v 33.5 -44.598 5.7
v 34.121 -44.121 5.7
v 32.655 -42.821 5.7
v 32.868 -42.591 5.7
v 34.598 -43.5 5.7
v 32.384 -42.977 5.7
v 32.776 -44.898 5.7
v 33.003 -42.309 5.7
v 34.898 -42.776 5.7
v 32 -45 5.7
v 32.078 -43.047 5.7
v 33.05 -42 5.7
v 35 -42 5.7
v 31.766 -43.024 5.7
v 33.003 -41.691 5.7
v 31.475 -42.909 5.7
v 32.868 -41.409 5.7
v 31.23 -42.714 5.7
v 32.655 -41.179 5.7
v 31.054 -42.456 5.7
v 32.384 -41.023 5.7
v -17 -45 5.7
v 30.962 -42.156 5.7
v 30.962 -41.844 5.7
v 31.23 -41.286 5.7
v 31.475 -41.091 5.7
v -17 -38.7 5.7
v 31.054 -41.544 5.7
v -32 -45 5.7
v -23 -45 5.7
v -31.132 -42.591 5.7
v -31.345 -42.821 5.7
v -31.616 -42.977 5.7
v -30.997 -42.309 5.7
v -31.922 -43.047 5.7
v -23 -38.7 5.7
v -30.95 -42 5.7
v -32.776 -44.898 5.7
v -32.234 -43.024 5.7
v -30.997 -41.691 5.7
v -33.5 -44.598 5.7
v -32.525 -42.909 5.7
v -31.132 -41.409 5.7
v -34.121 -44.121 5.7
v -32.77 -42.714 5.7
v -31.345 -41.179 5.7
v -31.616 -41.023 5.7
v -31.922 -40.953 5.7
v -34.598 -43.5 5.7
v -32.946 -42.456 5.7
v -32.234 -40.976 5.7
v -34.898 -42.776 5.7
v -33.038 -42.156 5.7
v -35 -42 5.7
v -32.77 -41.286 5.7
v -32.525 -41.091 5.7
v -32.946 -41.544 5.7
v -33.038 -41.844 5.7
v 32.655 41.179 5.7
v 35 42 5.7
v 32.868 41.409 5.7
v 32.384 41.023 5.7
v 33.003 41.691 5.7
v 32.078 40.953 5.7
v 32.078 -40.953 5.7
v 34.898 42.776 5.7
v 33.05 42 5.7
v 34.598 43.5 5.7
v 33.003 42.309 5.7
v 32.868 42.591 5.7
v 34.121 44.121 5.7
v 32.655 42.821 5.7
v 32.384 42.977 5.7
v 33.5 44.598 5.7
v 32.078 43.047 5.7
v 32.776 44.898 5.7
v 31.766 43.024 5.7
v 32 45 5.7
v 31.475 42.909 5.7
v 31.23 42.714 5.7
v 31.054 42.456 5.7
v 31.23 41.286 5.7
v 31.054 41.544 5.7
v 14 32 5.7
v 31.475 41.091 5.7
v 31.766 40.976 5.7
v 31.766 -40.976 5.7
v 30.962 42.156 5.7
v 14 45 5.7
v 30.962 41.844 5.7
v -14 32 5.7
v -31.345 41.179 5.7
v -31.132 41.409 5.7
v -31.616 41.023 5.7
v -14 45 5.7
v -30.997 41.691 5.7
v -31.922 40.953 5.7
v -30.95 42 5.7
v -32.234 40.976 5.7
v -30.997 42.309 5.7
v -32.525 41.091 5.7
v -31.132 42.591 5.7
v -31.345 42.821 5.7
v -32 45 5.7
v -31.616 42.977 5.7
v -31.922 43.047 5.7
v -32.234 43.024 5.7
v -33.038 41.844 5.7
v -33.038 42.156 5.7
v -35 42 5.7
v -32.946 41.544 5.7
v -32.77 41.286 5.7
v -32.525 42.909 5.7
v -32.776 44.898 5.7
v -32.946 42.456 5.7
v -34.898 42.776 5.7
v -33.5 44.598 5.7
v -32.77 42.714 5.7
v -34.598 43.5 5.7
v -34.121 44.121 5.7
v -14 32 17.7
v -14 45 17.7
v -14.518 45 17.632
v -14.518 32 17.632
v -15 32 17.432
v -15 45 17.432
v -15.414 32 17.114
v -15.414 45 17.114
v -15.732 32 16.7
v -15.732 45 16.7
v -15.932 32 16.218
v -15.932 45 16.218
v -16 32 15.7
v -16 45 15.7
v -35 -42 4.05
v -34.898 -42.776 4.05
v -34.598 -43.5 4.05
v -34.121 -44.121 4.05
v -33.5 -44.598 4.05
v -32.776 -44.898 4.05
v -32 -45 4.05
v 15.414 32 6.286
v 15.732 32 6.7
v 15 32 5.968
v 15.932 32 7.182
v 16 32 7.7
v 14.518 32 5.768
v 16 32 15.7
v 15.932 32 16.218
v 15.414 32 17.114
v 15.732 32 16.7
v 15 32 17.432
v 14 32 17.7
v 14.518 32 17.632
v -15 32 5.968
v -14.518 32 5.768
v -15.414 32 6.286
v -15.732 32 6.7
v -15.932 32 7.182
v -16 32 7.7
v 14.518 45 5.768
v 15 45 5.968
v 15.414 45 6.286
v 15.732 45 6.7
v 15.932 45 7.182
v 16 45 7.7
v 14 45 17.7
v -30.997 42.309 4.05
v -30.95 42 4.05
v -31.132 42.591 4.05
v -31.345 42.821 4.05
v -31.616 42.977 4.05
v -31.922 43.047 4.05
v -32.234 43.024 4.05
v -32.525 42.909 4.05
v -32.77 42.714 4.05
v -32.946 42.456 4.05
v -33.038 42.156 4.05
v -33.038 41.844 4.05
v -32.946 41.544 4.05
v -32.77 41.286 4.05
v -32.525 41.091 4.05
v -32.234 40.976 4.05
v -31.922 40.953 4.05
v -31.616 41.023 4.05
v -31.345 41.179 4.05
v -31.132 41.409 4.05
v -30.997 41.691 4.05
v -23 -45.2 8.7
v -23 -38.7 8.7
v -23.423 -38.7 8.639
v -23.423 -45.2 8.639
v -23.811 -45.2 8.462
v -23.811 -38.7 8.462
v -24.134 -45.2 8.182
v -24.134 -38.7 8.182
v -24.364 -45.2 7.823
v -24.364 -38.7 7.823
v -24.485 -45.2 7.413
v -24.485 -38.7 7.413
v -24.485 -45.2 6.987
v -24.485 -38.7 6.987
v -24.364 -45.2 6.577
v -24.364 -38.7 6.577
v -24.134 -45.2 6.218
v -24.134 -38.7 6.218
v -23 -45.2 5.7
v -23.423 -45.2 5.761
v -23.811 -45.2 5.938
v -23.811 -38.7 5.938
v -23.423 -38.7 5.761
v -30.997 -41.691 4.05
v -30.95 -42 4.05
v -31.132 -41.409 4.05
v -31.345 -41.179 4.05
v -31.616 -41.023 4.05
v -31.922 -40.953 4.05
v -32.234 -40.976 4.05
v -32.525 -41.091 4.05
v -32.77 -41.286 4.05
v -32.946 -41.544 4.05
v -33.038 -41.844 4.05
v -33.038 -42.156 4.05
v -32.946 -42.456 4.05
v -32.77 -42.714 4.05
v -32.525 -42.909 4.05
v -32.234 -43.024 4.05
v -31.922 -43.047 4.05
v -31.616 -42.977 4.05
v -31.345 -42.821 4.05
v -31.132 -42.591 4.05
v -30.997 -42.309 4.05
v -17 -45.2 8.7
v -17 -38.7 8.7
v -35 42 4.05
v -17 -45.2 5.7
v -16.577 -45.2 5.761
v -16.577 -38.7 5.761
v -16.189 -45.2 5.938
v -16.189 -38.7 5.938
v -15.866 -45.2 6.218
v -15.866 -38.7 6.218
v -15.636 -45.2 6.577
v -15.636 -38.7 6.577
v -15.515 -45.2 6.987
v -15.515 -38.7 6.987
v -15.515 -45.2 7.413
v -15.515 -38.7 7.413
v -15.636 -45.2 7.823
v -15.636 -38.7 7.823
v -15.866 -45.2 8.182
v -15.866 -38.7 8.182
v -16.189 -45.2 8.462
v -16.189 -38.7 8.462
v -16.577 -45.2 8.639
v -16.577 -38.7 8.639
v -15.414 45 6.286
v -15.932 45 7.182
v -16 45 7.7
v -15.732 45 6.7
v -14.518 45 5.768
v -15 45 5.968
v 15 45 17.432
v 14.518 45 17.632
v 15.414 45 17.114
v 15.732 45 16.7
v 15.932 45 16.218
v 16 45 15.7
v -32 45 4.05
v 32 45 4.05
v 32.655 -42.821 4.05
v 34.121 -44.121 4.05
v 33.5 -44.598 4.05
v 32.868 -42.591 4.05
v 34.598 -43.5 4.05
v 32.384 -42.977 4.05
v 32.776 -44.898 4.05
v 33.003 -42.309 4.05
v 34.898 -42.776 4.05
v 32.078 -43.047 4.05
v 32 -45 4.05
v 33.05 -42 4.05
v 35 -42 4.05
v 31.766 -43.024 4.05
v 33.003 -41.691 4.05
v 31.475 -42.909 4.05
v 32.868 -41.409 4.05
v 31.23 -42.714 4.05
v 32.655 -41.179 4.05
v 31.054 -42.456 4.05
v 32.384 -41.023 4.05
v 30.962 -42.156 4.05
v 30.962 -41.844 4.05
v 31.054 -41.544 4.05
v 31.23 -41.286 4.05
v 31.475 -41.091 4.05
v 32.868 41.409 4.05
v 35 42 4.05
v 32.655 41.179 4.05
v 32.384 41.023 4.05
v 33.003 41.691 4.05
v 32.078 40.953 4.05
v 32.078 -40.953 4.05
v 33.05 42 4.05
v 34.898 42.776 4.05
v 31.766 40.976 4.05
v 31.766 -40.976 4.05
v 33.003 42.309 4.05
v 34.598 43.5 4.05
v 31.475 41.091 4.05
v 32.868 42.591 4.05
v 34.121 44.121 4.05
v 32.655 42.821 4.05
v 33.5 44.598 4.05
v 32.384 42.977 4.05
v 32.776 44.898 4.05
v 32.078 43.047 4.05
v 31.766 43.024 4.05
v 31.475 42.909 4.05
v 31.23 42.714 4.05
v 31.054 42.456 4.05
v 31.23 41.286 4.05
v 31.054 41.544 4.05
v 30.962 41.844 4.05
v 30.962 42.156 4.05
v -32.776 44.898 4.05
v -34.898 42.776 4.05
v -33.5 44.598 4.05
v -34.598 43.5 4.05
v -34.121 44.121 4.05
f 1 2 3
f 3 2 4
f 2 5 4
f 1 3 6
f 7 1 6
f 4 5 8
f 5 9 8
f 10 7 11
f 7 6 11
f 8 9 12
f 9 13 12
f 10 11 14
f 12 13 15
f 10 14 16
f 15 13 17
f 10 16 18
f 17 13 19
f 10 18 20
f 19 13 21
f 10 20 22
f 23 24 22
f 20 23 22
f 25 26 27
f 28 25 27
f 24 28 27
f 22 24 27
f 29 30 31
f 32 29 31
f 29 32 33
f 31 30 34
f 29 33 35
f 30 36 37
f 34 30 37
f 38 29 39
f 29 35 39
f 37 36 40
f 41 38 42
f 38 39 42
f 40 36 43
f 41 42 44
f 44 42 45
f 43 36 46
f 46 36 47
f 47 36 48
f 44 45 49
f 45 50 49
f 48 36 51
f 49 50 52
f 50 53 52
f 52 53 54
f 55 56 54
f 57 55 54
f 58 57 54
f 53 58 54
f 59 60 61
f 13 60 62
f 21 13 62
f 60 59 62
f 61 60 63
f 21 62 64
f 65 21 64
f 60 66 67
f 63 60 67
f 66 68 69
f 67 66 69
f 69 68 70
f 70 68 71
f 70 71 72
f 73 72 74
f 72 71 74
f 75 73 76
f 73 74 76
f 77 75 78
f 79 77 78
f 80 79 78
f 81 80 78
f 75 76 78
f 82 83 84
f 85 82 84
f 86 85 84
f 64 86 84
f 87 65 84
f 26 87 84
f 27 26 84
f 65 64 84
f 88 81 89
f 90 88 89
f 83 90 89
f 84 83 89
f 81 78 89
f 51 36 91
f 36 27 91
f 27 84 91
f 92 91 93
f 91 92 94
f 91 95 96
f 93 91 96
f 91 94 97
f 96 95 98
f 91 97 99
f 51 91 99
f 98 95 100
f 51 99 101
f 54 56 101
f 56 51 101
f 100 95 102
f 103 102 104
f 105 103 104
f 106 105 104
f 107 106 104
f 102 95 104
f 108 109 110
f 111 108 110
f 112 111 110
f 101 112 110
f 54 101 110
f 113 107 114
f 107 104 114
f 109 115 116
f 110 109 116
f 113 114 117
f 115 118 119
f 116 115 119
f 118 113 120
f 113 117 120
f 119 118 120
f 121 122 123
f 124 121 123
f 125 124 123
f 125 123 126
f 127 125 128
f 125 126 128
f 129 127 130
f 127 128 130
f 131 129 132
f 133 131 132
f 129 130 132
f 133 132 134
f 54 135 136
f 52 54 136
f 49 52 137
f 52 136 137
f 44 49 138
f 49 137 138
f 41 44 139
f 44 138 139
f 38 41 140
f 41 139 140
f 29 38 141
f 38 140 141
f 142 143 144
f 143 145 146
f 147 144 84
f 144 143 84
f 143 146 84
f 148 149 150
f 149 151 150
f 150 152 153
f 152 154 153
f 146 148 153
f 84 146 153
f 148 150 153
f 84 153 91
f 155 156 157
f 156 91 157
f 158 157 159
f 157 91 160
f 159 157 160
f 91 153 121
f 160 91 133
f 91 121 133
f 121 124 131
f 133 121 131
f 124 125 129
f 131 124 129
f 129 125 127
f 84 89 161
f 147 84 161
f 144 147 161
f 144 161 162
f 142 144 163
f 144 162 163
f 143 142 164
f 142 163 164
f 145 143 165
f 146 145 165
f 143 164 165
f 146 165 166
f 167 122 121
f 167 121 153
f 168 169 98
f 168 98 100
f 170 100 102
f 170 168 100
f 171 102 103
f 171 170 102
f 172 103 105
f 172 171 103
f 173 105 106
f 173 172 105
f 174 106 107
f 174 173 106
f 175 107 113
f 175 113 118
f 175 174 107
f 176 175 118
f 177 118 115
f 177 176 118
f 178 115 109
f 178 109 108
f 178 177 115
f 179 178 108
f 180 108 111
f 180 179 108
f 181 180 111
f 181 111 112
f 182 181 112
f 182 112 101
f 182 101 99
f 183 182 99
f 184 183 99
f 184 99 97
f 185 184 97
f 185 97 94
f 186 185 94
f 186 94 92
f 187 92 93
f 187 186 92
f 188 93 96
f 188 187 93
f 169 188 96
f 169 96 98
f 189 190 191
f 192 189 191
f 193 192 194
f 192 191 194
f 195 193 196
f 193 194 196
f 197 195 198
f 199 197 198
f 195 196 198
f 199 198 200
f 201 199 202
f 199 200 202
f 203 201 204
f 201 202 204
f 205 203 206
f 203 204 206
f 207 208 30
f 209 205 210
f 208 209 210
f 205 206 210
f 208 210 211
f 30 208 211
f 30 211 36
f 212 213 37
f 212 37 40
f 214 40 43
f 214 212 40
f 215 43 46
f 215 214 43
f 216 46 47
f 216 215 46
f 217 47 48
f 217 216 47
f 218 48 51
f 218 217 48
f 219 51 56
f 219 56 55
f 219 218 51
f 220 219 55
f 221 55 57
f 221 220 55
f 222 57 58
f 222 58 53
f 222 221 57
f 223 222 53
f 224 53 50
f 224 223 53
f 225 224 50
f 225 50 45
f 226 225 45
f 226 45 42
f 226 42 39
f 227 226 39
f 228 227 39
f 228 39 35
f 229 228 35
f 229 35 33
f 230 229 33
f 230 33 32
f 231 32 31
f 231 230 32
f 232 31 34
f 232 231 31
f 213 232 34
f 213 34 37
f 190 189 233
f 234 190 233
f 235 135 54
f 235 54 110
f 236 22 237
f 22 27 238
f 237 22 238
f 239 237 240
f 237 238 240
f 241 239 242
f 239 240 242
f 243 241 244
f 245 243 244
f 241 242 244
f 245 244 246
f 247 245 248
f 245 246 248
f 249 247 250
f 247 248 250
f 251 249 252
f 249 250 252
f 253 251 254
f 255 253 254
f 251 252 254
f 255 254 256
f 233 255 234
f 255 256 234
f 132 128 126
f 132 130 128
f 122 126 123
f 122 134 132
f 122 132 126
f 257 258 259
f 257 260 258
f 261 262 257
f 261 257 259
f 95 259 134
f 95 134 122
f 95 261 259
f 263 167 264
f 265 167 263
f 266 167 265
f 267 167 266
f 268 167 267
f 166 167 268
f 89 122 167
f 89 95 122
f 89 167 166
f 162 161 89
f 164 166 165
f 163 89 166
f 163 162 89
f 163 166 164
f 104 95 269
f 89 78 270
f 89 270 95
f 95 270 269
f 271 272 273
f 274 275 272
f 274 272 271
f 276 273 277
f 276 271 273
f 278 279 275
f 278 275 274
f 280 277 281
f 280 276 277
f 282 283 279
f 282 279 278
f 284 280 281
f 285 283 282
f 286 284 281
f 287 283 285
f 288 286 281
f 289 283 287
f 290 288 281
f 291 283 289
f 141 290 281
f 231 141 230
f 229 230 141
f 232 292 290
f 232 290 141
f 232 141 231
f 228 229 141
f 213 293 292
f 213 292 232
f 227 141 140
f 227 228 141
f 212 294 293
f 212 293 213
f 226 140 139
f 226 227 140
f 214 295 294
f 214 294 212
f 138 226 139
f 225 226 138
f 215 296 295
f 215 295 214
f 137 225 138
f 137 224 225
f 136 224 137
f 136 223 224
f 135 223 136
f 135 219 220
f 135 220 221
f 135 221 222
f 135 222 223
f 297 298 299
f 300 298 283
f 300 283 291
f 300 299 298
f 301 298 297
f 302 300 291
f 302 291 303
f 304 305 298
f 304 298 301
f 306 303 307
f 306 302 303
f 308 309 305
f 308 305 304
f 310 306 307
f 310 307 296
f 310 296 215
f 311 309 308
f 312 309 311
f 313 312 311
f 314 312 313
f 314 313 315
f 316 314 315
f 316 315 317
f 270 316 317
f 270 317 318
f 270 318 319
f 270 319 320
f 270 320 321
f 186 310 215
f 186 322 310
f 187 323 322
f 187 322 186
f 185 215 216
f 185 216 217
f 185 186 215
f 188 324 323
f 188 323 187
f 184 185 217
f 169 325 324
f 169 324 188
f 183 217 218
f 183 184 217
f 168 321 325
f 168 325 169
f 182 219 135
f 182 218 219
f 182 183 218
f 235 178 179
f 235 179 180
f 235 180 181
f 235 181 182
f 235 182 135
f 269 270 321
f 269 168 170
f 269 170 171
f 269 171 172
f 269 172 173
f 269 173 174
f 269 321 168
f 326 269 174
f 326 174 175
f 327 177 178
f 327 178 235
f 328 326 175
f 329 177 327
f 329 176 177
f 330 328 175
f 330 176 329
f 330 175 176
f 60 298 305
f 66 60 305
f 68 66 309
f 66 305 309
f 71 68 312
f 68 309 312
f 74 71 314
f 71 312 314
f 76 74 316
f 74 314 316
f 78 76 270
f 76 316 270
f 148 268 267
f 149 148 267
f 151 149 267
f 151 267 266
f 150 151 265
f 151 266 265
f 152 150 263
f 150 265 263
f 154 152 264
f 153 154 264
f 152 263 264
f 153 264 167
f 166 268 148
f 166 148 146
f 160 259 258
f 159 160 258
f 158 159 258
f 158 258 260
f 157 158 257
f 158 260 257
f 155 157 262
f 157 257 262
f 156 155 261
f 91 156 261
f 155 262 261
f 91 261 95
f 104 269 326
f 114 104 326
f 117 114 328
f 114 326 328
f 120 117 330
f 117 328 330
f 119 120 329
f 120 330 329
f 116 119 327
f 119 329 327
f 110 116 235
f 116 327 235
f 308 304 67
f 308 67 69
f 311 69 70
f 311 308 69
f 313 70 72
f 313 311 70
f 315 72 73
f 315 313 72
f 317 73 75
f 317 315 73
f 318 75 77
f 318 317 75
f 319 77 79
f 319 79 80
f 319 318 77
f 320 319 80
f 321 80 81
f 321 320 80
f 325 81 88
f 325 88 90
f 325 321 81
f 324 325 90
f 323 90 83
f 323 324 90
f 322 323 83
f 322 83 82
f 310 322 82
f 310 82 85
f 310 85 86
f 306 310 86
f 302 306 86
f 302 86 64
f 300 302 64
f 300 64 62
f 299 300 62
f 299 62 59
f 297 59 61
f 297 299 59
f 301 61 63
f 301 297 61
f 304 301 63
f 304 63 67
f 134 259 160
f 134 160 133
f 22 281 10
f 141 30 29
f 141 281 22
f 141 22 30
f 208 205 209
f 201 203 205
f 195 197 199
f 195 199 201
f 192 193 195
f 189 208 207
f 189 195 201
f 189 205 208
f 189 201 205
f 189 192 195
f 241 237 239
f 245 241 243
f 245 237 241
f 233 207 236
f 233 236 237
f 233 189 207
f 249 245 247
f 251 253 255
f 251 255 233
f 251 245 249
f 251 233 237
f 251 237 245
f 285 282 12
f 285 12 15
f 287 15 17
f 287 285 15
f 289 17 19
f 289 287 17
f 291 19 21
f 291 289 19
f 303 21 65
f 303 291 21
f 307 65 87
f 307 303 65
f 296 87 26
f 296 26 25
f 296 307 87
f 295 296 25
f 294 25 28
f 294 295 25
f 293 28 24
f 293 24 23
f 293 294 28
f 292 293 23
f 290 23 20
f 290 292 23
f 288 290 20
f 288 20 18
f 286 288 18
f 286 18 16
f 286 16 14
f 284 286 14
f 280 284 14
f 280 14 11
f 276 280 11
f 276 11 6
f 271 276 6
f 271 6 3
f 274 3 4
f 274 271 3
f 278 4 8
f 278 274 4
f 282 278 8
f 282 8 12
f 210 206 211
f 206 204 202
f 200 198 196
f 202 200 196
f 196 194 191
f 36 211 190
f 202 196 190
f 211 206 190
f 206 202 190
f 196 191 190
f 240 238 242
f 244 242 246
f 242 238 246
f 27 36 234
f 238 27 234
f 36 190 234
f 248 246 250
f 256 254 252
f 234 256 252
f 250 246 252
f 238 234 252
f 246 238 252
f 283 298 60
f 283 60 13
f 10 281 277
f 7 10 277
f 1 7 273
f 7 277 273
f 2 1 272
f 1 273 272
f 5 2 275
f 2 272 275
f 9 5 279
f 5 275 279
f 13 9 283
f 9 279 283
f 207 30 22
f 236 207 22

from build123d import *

# Parameters (mm, degrees)
PAD006_DEPTH = 13
PAD007_DEPTH = 6.5
SKETCH005_R  = 1.05
PAD005_DEPTH = 1.65


with BuildPart() as connectorbody:
    # Sketch006 → Pad006 (new body)
    with BuildSketch(Plane.XZ):
        with BuildLine():
            Line((-14, 6), (14, 6))
            ThreePointArc((16, 4), (15.414214, 5.414214), (14, 6))
            Line((16, 4), (16, -4))
            ThreePointArc((14, -6), (15.414214, -5.414214), (16, -4))
            Line((14, -6), (-14, -6))
            ThreePointArc((-16, -4), (-15.414214, -5.414214), (-14, -6))
            Line((-16, -4), (-16, 4))
            ThreePointArc((-14, 6), (-15.414214, 5.414214), (-16, 4))
        make_face()
    extrude(amount=PAD006_DEPTH)


with BuildPart() as connectorbody_1:
    # Body005 placement: moved
    add(connectorbody.part.moved(Location((0, 45, 7.65))))


with BuildPart() as usbbody:
    # Sketch007 → Pad007 (new body)
    with BuildSketch(Plane.XZ):
        with BuildLine():
            ThreePointArc((-3, 1.5), (-4.5, 0), (-3, -1.5))
            Line((-3, -1.5), (3, -1.5))
            ThreePointArc((3, -1.5), (4.5, 0), (3, 1.5))
            Line((-3, 1.5), (3, 1.5))
        make_face()
    extrude(amount=PAD007_DEPTH)


with BuildPart() as usbbody_1:
    # Body006 placement: moved
    add(usbbody.part.moved(Location((-20, -38.7, 3.15))))


with BuildPart() as boardpart:
    # Sketch005 → Pad005 (new body)
    with BuildSketch(Plane.XY):
        with BuildLine():
            Line((-32, 45), (32, 45))
            ThreePointArc((35, 42), (34.12132, 44.12132), (32, 45))
            Line((35, 42), (35, -42))
            ThreePointArc((32, -45), (34.12132, -44.12132), (35, -42))
            Line((32, -45), (-32, -45))
            ThreePointArc((-35, -42), (-34.12132, -44.12132), (-32, -45))
            Line((-35, -42), (-35, 42))
            ThreePointArc((-32, 45), (-34.12132, 44.12132), (-35, 42))
        make_face()
        with Locations((-32, -42)):
            Circle(SKETCH005_R, mode=Mode.SUBTRACT)
        with Locations((32, -42)):
            Circle(SKETCH005_R, mode=Mode.SUBTRACT)
        with Locations((32, 42)):
            Circle(SKETCH005_R, mode=Mode.SUBTRACT)
        with Locations((-32, 42)):
            Circle(SKETCH005_R, mode=Mode.SUBTRACT)
    extrude(amount=PAD005_DEPTH)

    # Fusion: union ConnectorBody, UsbBody
    add(connectorbody_1.part)
    add(usbbody_1.part)


with BuildPart() as boardpart_1:
    # Fusion placement: moved
    add(boardpart.part.moved(Location((0, 0, 4.05))))


solid = boardpart_1.part
